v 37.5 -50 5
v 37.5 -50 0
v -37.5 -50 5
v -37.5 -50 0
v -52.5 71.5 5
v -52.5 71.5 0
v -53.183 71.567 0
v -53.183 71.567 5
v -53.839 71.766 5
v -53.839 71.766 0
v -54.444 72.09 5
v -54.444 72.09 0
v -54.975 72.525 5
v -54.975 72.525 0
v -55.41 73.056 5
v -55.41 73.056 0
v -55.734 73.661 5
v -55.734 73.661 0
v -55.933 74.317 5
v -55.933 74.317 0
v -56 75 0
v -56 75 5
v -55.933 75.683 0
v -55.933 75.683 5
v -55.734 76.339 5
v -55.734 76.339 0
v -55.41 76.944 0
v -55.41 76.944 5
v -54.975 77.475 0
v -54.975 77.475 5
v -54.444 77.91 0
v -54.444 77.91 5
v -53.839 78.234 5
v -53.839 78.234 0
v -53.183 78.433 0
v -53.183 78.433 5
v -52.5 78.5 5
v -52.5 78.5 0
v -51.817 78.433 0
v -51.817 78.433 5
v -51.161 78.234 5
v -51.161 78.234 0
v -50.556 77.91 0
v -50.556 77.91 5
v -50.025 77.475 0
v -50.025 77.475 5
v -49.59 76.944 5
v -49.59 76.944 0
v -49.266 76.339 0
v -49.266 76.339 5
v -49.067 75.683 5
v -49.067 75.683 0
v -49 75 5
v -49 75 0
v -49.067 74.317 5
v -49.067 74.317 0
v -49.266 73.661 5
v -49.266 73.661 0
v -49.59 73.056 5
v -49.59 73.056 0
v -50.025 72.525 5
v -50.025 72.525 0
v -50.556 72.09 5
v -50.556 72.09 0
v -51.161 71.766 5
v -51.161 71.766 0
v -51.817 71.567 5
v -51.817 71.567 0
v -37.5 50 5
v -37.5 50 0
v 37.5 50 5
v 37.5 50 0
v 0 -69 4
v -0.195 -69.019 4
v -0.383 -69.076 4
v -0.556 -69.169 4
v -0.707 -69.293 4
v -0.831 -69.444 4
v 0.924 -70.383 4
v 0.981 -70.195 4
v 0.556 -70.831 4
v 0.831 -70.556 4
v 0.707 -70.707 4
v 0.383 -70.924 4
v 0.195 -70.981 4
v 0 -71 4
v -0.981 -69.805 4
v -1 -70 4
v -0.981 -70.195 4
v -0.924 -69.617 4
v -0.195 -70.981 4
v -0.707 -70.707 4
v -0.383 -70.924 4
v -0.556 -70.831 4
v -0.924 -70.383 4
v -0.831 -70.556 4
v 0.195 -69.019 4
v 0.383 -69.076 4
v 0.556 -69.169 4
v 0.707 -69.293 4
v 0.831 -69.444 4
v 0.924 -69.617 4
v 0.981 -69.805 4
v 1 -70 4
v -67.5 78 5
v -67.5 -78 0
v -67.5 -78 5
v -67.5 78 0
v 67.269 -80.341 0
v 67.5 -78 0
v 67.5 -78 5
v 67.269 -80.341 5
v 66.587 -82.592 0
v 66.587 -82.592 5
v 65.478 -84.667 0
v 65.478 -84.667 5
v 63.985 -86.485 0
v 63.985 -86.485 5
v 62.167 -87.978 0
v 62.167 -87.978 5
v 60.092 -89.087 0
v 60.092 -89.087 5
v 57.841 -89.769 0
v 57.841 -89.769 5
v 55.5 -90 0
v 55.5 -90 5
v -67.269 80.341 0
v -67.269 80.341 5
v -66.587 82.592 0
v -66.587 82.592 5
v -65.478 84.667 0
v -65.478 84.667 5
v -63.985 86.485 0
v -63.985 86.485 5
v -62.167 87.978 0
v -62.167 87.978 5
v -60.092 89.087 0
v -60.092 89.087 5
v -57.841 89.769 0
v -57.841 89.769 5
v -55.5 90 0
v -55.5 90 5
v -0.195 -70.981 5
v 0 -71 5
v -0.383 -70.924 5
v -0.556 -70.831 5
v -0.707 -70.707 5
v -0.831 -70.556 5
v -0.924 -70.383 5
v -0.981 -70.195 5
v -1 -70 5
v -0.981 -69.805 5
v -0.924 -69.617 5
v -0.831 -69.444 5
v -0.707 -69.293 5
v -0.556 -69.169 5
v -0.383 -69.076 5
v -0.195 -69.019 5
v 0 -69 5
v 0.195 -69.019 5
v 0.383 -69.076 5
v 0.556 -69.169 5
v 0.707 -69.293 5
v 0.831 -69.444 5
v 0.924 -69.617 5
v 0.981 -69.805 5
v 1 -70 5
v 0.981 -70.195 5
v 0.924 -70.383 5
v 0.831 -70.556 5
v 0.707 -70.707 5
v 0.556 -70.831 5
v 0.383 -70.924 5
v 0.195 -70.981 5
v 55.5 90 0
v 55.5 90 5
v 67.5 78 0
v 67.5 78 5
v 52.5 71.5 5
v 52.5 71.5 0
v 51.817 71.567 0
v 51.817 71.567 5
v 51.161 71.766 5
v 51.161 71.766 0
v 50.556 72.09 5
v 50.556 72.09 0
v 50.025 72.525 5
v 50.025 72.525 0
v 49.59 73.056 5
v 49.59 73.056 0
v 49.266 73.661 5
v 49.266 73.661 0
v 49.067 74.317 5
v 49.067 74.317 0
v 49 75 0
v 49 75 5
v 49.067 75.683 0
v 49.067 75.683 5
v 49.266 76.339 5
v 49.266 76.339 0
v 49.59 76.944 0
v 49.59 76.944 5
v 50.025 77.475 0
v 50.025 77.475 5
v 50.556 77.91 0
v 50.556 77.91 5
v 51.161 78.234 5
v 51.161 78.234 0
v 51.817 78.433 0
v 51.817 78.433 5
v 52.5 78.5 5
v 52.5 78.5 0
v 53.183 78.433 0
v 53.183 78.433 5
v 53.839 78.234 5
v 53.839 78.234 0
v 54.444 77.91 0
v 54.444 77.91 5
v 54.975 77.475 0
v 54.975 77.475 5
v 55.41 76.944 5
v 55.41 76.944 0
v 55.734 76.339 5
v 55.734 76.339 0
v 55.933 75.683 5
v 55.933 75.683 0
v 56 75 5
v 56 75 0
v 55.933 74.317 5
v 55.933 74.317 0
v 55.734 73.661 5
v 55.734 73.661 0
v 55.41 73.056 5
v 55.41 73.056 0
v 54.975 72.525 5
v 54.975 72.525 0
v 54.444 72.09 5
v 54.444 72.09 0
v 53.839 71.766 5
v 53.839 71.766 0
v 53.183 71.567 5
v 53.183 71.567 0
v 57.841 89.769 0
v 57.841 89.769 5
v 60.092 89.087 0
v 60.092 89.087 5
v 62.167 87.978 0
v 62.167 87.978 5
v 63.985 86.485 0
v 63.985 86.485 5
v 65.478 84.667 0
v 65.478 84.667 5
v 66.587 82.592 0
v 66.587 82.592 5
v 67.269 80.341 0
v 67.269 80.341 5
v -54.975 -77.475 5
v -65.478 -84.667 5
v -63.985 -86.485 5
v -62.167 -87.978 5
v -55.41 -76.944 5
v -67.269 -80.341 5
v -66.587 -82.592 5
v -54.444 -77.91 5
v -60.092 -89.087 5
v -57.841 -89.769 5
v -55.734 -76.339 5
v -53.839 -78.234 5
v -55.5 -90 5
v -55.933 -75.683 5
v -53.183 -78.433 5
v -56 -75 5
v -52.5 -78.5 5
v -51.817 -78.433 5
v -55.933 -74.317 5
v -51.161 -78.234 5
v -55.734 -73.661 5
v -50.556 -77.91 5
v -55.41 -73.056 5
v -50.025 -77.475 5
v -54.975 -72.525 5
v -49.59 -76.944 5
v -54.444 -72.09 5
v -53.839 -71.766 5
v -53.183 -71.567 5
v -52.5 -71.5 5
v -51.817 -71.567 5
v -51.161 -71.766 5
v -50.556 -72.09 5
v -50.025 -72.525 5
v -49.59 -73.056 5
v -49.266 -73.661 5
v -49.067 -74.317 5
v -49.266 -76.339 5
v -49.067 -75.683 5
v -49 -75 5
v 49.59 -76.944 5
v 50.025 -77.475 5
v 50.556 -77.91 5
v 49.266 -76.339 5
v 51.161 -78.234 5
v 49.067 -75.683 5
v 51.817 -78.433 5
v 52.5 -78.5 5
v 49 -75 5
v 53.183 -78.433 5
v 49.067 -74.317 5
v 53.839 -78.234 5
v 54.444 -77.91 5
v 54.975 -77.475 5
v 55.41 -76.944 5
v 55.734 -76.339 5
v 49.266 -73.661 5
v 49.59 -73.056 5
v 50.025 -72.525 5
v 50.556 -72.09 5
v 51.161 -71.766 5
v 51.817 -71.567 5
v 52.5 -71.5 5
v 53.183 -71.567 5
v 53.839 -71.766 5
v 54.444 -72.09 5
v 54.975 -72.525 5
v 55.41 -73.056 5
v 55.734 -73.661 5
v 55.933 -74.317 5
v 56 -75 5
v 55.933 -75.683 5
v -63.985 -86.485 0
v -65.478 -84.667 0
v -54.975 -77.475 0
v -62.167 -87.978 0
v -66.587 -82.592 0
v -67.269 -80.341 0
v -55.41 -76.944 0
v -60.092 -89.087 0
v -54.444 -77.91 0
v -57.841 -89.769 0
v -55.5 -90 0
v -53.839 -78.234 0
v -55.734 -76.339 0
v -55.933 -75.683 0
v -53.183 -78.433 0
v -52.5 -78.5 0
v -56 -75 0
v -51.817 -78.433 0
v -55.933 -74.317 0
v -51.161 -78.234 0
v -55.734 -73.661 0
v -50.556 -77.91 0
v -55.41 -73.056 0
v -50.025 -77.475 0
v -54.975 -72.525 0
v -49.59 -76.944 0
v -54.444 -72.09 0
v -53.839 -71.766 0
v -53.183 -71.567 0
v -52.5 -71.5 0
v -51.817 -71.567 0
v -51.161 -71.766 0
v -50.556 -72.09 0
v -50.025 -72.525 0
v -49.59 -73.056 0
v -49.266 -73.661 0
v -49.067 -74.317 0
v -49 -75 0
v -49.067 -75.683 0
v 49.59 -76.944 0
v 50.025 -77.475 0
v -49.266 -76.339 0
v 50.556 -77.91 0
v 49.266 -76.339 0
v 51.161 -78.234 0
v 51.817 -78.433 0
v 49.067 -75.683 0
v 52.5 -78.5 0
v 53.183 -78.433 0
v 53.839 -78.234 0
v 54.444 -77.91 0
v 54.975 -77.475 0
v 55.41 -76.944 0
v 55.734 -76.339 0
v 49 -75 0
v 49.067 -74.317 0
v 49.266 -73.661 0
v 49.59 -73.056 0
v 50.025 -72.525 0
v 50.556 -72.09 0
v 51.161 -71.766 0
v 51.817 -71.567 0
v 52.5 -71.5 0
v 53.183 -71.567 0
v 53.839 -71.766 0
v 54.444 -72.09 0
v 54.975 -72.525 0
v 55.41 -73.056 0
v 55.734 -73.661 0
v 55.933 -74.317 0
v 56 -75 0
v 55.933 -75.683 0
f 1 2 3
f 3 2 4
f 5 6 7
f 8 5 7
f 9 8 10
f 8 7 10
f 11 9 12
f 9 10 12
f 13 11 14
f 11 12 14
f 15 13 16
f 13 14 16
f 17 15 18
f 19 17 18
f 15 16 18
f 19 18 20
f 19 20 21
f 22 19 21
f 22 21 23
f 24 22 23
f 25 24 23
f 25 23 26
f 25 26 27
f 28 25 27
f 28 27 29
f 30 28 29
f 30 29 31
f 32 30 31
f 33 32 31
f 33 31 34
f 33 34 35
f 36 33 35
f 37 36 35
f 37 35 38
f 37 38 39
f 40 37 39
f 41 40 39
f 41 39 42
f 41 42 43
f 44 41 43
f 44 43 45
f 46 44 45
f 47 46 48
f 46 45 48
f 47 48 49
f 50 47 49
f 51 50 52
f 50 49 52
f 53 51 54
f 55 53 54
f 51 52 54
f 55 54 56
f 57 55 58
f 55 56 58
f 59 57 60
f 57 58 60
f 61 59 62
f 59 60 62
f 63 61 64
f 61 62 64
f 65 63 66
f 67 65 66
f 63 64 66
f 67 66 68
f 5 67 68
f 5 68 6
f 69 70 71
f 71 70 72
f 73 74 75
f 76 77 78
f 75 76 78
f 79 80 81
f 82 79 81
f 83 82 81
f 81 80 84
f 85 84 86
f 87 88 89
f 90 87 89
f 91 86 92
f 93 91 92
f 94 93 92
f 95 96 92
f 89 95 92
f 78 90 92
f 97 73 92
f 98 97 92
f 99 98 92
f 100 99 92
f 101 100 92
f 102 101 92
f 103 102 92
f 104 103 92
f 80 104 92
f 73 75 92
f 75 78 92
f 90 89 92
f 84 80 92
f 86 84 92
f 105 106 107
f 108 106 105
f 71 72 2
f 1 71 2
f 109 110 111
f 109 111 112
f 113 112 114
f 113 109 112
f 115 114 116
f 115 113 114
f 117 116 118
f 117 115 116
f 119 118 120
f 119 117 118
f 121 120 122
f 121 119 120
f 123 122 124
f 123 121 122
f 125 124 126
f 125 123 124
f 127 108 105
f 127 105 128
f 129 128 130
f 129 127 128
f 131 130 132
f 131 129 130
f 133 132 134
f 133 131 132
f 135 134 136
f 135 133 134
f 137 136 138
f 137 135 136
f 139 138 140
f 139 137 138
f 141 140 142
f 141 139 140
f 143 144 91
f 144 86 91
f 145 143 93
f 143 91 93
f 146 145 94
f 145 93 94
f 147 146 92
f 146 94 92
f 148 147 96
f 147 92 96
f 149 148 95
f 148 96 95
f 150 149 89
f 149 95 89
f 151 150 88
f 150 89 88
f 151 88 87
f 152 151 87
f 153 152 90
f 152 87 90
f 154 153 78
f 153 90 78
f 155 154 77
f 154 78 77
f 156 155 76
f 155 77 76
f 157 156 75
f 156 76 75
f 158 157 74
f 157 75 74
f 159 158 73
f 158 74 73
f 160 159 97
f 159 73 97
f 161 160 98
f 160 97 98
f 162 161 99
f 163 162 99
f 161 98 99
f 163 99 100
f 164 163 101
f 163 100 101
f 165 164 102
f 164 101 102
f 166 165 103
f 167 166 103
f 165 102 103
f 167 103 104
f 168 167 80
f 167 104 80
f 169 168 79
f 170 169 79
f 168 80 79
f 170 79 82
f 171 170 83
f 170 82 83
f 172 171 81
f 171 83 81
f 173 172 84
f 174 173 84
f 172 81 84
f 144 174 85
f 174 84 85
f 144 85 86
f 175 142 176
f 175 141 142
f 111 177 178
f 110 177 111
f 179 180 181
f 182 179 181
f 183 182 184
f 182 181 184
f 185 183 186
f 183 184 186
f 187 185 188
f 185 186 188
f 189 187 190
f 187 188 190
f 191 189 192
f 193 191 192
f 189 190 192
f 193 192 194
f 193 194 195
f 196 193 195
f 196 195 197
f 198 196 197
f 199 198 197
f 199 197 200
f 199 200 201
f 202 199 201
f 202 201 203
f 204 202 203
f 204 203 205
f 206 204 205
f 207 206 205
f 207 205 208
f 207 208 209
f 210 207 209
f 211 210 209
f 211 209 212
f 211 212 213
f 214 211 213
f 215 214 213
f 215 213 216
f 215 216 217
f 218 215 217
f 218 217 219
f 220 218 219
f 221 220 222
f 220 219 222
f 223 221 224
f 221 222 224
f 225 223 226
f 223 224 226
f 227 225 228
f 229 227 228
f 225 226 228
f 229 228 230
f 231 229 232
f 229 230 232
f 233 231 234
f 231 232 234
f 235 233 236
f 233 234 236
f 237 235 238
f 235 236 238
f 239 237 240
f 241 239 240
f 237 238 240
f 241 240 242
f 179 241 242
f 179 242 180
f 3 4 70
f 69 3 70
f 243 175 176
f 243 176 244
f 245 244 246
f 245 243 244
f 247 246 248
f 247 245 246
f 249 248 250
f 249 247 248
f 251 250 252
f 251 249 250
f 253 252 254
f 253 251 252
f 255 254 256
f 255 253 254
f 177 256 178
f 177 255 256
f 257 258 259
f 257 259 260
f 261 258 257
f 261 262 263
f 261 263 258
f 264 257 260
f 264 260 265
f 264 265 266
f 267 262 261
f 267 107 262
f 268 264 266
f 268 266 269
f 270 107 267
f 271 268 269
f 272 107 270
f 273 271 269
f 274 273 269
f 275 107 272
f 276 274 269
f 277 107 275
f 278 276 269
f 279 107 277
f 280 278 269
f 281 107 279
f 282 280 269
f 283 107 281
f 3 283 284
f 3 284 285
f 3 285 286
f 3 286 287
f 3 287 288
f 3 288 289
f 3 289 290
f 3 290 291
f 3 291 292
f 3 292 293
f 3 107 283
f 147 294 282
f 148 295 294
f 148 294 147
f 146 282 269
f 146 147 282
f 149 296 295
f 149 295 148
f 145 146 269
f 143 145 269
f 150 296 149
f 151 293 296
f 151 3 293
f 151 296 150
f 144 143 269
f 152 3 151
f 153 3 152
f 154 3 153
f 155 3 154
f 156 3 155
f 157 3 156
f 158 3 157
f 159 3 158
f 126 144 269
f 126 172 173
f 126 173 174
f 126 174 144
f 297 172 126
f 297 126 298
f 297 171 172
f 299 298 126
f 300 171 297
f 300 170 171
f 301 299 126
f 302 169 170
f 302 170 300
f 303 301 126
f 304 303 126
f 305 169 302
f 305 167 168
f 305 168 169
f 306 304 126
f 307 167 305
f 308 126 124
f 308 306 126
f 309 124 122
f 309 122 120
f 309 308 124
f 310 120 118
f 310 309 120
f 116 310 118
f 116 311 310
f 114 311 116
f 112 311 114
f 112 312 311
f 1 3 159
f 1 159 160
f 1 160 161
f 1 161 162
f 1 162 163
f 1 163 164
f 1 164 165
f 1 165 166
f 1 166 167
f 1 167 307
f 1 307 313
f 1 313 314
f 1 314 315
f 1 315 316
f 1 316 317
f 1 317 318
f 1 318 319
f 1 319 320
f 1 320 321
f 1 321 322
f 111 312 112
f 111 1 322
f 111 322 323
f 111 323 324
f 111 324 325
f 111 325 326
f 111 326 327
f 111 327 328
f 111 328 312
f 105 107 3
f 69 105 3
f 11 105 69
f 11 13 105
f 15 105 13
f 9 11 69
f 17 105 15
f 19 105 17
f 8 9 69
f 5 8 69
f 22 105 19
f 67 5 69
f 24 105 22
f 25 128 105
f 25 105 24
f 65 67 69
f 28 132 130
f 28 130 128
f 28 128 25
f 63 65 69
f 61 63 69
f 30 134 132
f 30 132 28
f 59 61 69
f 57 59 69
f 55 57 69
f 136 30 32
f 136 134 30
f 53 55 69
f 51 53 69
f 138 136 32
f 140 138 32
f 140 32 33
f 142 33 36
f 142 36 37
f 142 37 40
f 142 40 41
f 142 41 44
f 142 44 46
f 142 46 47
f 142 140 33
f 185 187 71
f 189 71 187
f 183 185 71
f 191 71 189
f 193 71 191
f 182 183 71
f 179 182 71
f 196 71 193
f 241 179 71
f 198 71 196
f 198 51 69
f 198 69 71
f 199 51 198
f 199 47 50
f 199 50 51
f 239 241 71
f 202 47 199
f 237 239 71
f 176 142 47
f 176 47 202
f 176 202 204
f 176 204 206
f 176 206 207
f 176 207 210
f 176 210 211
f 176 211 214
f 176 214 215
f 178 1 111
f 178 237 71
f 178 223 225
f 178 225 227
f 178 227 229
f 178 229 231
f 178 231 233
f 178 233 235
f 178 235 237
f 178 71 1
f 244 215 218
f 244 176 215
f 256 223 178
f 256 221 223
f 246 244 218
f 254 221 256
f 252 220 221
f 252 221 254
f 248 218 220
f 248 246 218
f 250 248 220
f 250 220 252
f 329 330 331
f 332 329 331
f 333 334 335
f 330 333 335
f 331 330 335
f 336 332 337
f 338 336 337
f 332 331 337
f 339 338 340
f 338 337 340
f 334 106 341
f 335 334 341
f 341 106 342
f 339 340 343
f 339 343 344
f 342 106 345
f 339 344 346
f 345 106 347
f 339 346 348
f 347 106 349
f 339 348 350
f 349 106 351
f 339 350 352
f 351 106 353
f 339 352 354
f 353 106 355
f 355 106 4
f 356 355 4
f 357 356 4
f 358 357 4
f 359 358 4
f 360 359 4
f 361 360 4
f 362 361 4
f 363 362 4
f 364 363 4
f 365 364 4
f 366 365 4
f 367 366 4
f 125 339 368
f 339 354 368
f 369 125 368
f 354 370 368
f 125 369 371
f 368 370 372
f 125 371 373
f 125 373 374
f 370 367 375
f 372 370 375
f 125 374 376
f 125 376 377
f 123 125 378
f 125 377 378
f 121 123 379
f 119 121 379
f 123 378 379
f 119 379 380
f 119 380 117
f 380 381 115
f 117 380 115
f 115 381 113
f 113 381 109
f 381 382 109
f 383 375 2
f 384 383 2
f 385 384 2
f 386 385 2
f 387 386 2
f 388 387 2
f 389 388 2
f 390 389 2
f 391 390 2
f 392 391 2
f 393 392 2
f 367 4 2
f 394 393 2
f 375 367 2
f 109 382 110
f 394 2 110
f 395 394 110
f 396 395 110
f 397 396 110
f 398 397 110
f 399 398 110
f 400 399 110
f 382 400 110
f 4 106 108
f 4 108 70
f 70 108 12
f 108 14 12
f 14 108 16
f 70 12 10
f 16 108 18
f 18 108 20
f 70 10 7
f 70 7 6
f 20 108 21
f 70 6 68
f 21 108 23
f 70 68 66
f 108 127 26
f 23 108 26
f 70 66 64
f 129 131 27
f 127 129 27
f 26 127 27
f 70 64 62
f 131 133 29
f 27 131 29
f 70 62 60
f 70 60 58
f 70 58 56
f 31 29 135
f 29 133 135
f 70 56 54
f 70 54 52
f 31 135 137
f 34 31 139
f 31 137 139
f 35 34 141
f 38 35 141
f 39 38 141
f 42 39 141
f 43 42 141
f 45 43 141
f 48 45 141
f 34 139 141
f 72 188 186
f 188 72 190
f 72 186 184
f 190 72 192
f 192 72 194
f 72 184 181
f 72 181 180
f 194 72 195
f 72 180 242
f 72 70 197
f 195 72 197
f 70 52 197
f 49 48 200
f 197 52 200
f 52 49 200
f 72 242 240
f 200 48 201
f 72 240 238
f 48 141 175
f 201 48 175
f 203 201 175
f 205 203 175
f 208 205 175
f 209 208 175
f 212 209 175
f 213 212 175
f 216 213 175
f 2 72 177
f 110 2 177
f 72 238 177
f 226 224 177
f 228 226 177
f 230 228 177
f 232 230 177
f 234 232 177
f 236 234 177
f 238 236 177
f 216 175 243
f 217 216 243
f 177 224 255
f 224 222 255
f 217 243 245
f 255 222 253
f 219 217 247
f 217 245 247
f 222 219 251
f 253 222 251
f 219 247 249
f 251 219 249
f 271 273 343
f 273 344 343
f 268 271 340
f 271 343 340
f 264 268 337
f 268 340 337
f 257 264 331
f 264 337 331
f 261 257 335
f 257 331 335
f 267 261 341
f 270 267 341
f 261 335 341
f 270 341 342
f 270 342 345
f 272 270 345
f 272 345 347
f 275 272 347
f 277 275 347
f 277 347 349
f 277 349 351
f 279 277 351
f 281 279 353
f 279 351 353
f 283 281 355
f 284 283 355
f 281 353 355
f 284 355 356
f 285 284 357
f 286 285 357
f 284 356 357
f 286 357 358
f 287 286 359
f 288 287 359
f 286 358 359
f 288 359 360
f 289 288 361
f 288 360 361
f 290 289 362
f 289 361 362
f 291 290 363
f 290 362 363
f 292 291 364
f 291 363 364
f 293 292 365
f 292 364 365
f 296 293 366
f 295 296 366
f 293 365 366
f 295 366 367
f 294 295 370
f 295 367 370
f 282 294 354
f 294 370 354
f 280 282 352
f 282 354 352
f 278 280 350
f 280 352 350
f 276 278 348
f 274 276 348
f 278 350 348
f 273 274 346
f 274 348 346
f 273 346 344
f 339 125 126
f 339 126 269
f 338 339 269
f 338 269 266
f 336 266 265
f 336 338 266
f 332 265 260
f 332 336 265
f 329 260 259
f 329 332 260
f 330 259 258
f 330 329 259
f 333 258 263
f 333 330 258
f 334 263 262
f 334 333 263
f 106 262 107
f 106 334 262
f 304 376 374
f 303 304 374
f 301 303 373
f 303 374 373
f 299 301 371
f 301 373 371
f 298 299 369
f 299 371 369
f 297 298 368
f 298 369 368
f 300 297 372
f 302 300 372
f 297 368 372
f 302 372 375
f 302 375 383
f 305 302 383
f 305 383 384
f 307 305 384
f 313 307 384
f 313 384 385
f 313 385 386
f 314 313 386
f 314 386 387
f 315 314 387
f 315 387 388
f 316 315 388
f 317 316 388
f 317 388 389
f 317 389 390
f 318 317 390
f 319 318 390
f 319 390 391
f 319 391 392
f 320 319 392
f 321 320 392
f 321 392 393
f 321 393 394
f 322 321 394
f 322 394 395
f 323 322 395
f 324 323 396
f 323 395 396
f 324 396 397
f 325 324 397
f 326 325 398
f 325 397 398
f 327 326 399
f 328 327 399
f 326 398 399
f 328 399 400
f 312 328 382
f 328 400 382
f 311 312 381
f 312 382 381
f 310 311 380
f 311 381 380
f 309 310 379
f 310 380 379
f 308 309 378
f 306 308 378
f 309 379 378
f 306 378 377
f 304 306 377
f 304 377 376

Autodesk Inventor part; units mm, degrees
ref_plane "YZ Plane" through (0, 0, 0) normal (1, 0, 0) x (0, 1, 0)
ref_plane "XZ Plane" through (0, 0, 0) normal (0, 1, 0) x (-1, 0, 0)
ref_plane "XY Plane" through (0, 0, 0) normal (0, 0, 1) x (1, 0, 0)
sketch "Sketch1" plane through (0, 0, 0) normal (0, 0, 1) x (1, 0, 0)
  line L0 (-55.5, 90) -> (55.5, 90)
  line L1 (67.5, 78) -> (67.5, -78)
  line L2 (55.5, -90) -> (-55.5, -90)
  line L3 (-67.5, -78) -> (-67.5, 78)
  line L4 (-37.5, 50) -> (37.5, 50)
  line L5 (37.5, 50) -> (37.5, -50)
  line L6 (37.5, -50) -> (-37.5, -50)
  line L7 (-37.5, -50) -> (-37.5, 50)
  arc A0 (-55.5, 90) -> (-67.5, 78) centre (-55.5, 78) ccw
  arc A1 (67.5, 78) -> (55.5, 90) centre (55.5, 78) ccw
  arc A2 (55.5, -90) -> (67.5, -78) centre (55.5, -78) ccw
  arc A3 (-67.5, -78) -> (-55.5, -90) centre (-55.5, -78) ccw
  point P0 (0, 0)
  point P1 (-67.5, 90)
  point P2 (67.5, -90)
  point P3 (67.5, 90)
  point P4 (-67.5, -90)
  dimension "d0" = 180
  dimension "d2" = 100
  dimension "d3" = 40
  dimension "d4" = 40
  dimension "d7" = 30
  dimension "d8" = 30
  dimension "d10" = 75
  dimension "d11" = 12
  dimension "d21" = 37.5
  dimension "d22" = 50
extrude "Extrusion1" add sketch "Sketch1" along normal blind 5
sketch "Sketch3" plane through (0, 0, 5) normal (0, 0, 1) x (1, 0, 0)
  line L0 (55.5, 90) -> (-55.5, 90) construction
  line L1 (0, 90) -> (0, -90) construction
  line L2 (-55.5, -90) -> (55.5, -90) construction
  line L3 (-67.5, 78) -> (-67.5, -78) construction
  line L4 (-67.5, 0) -> (67.5, 0) construction
  line L5 (67.5, -78) -> (67.5, 78) construction
  point P0 (0, 0)
  point P1 (-52.5, 75)
  point P2 (52.5, 75)
  point P3 (52.5, -75)
  point P4 (-52.5, -75)
  dimension "d12" = 15
  dimension "d13" = 15
hole "Hole1" at (-52.5, 75, 5) at (52.5, 75, 5) at (52.5, -75, 5) at (-52.5, -75, 5) direction (0, 0, -1) diameter 7 end through all
sketch "Sketch4" plane through (0, 0, 5) normal (0, 0, 1) x (1, 0, 0)
  line L0 (-55.5, -90) -> (55.5, -90) projected
  line L1 (67.5, -78) -> (67.5, 78) projected
  point P0 (0, 0)
  point P1 (0, -70)
  dimension "d23" = 20
  dimension "d24" = 67.5
hole "Hole2" at (0, -70, 5) direction (0, 0, -1) diameter 2 depth 1
equation "\"d3\" = d4"
equation "\"d8\" = d7"
equation "\"d21\" = 0.5 * d10"
equation "\"d22\" = 0.5 * d2"
properties part number "TapaBC" material "MDF Medium Density Fiberboard"
